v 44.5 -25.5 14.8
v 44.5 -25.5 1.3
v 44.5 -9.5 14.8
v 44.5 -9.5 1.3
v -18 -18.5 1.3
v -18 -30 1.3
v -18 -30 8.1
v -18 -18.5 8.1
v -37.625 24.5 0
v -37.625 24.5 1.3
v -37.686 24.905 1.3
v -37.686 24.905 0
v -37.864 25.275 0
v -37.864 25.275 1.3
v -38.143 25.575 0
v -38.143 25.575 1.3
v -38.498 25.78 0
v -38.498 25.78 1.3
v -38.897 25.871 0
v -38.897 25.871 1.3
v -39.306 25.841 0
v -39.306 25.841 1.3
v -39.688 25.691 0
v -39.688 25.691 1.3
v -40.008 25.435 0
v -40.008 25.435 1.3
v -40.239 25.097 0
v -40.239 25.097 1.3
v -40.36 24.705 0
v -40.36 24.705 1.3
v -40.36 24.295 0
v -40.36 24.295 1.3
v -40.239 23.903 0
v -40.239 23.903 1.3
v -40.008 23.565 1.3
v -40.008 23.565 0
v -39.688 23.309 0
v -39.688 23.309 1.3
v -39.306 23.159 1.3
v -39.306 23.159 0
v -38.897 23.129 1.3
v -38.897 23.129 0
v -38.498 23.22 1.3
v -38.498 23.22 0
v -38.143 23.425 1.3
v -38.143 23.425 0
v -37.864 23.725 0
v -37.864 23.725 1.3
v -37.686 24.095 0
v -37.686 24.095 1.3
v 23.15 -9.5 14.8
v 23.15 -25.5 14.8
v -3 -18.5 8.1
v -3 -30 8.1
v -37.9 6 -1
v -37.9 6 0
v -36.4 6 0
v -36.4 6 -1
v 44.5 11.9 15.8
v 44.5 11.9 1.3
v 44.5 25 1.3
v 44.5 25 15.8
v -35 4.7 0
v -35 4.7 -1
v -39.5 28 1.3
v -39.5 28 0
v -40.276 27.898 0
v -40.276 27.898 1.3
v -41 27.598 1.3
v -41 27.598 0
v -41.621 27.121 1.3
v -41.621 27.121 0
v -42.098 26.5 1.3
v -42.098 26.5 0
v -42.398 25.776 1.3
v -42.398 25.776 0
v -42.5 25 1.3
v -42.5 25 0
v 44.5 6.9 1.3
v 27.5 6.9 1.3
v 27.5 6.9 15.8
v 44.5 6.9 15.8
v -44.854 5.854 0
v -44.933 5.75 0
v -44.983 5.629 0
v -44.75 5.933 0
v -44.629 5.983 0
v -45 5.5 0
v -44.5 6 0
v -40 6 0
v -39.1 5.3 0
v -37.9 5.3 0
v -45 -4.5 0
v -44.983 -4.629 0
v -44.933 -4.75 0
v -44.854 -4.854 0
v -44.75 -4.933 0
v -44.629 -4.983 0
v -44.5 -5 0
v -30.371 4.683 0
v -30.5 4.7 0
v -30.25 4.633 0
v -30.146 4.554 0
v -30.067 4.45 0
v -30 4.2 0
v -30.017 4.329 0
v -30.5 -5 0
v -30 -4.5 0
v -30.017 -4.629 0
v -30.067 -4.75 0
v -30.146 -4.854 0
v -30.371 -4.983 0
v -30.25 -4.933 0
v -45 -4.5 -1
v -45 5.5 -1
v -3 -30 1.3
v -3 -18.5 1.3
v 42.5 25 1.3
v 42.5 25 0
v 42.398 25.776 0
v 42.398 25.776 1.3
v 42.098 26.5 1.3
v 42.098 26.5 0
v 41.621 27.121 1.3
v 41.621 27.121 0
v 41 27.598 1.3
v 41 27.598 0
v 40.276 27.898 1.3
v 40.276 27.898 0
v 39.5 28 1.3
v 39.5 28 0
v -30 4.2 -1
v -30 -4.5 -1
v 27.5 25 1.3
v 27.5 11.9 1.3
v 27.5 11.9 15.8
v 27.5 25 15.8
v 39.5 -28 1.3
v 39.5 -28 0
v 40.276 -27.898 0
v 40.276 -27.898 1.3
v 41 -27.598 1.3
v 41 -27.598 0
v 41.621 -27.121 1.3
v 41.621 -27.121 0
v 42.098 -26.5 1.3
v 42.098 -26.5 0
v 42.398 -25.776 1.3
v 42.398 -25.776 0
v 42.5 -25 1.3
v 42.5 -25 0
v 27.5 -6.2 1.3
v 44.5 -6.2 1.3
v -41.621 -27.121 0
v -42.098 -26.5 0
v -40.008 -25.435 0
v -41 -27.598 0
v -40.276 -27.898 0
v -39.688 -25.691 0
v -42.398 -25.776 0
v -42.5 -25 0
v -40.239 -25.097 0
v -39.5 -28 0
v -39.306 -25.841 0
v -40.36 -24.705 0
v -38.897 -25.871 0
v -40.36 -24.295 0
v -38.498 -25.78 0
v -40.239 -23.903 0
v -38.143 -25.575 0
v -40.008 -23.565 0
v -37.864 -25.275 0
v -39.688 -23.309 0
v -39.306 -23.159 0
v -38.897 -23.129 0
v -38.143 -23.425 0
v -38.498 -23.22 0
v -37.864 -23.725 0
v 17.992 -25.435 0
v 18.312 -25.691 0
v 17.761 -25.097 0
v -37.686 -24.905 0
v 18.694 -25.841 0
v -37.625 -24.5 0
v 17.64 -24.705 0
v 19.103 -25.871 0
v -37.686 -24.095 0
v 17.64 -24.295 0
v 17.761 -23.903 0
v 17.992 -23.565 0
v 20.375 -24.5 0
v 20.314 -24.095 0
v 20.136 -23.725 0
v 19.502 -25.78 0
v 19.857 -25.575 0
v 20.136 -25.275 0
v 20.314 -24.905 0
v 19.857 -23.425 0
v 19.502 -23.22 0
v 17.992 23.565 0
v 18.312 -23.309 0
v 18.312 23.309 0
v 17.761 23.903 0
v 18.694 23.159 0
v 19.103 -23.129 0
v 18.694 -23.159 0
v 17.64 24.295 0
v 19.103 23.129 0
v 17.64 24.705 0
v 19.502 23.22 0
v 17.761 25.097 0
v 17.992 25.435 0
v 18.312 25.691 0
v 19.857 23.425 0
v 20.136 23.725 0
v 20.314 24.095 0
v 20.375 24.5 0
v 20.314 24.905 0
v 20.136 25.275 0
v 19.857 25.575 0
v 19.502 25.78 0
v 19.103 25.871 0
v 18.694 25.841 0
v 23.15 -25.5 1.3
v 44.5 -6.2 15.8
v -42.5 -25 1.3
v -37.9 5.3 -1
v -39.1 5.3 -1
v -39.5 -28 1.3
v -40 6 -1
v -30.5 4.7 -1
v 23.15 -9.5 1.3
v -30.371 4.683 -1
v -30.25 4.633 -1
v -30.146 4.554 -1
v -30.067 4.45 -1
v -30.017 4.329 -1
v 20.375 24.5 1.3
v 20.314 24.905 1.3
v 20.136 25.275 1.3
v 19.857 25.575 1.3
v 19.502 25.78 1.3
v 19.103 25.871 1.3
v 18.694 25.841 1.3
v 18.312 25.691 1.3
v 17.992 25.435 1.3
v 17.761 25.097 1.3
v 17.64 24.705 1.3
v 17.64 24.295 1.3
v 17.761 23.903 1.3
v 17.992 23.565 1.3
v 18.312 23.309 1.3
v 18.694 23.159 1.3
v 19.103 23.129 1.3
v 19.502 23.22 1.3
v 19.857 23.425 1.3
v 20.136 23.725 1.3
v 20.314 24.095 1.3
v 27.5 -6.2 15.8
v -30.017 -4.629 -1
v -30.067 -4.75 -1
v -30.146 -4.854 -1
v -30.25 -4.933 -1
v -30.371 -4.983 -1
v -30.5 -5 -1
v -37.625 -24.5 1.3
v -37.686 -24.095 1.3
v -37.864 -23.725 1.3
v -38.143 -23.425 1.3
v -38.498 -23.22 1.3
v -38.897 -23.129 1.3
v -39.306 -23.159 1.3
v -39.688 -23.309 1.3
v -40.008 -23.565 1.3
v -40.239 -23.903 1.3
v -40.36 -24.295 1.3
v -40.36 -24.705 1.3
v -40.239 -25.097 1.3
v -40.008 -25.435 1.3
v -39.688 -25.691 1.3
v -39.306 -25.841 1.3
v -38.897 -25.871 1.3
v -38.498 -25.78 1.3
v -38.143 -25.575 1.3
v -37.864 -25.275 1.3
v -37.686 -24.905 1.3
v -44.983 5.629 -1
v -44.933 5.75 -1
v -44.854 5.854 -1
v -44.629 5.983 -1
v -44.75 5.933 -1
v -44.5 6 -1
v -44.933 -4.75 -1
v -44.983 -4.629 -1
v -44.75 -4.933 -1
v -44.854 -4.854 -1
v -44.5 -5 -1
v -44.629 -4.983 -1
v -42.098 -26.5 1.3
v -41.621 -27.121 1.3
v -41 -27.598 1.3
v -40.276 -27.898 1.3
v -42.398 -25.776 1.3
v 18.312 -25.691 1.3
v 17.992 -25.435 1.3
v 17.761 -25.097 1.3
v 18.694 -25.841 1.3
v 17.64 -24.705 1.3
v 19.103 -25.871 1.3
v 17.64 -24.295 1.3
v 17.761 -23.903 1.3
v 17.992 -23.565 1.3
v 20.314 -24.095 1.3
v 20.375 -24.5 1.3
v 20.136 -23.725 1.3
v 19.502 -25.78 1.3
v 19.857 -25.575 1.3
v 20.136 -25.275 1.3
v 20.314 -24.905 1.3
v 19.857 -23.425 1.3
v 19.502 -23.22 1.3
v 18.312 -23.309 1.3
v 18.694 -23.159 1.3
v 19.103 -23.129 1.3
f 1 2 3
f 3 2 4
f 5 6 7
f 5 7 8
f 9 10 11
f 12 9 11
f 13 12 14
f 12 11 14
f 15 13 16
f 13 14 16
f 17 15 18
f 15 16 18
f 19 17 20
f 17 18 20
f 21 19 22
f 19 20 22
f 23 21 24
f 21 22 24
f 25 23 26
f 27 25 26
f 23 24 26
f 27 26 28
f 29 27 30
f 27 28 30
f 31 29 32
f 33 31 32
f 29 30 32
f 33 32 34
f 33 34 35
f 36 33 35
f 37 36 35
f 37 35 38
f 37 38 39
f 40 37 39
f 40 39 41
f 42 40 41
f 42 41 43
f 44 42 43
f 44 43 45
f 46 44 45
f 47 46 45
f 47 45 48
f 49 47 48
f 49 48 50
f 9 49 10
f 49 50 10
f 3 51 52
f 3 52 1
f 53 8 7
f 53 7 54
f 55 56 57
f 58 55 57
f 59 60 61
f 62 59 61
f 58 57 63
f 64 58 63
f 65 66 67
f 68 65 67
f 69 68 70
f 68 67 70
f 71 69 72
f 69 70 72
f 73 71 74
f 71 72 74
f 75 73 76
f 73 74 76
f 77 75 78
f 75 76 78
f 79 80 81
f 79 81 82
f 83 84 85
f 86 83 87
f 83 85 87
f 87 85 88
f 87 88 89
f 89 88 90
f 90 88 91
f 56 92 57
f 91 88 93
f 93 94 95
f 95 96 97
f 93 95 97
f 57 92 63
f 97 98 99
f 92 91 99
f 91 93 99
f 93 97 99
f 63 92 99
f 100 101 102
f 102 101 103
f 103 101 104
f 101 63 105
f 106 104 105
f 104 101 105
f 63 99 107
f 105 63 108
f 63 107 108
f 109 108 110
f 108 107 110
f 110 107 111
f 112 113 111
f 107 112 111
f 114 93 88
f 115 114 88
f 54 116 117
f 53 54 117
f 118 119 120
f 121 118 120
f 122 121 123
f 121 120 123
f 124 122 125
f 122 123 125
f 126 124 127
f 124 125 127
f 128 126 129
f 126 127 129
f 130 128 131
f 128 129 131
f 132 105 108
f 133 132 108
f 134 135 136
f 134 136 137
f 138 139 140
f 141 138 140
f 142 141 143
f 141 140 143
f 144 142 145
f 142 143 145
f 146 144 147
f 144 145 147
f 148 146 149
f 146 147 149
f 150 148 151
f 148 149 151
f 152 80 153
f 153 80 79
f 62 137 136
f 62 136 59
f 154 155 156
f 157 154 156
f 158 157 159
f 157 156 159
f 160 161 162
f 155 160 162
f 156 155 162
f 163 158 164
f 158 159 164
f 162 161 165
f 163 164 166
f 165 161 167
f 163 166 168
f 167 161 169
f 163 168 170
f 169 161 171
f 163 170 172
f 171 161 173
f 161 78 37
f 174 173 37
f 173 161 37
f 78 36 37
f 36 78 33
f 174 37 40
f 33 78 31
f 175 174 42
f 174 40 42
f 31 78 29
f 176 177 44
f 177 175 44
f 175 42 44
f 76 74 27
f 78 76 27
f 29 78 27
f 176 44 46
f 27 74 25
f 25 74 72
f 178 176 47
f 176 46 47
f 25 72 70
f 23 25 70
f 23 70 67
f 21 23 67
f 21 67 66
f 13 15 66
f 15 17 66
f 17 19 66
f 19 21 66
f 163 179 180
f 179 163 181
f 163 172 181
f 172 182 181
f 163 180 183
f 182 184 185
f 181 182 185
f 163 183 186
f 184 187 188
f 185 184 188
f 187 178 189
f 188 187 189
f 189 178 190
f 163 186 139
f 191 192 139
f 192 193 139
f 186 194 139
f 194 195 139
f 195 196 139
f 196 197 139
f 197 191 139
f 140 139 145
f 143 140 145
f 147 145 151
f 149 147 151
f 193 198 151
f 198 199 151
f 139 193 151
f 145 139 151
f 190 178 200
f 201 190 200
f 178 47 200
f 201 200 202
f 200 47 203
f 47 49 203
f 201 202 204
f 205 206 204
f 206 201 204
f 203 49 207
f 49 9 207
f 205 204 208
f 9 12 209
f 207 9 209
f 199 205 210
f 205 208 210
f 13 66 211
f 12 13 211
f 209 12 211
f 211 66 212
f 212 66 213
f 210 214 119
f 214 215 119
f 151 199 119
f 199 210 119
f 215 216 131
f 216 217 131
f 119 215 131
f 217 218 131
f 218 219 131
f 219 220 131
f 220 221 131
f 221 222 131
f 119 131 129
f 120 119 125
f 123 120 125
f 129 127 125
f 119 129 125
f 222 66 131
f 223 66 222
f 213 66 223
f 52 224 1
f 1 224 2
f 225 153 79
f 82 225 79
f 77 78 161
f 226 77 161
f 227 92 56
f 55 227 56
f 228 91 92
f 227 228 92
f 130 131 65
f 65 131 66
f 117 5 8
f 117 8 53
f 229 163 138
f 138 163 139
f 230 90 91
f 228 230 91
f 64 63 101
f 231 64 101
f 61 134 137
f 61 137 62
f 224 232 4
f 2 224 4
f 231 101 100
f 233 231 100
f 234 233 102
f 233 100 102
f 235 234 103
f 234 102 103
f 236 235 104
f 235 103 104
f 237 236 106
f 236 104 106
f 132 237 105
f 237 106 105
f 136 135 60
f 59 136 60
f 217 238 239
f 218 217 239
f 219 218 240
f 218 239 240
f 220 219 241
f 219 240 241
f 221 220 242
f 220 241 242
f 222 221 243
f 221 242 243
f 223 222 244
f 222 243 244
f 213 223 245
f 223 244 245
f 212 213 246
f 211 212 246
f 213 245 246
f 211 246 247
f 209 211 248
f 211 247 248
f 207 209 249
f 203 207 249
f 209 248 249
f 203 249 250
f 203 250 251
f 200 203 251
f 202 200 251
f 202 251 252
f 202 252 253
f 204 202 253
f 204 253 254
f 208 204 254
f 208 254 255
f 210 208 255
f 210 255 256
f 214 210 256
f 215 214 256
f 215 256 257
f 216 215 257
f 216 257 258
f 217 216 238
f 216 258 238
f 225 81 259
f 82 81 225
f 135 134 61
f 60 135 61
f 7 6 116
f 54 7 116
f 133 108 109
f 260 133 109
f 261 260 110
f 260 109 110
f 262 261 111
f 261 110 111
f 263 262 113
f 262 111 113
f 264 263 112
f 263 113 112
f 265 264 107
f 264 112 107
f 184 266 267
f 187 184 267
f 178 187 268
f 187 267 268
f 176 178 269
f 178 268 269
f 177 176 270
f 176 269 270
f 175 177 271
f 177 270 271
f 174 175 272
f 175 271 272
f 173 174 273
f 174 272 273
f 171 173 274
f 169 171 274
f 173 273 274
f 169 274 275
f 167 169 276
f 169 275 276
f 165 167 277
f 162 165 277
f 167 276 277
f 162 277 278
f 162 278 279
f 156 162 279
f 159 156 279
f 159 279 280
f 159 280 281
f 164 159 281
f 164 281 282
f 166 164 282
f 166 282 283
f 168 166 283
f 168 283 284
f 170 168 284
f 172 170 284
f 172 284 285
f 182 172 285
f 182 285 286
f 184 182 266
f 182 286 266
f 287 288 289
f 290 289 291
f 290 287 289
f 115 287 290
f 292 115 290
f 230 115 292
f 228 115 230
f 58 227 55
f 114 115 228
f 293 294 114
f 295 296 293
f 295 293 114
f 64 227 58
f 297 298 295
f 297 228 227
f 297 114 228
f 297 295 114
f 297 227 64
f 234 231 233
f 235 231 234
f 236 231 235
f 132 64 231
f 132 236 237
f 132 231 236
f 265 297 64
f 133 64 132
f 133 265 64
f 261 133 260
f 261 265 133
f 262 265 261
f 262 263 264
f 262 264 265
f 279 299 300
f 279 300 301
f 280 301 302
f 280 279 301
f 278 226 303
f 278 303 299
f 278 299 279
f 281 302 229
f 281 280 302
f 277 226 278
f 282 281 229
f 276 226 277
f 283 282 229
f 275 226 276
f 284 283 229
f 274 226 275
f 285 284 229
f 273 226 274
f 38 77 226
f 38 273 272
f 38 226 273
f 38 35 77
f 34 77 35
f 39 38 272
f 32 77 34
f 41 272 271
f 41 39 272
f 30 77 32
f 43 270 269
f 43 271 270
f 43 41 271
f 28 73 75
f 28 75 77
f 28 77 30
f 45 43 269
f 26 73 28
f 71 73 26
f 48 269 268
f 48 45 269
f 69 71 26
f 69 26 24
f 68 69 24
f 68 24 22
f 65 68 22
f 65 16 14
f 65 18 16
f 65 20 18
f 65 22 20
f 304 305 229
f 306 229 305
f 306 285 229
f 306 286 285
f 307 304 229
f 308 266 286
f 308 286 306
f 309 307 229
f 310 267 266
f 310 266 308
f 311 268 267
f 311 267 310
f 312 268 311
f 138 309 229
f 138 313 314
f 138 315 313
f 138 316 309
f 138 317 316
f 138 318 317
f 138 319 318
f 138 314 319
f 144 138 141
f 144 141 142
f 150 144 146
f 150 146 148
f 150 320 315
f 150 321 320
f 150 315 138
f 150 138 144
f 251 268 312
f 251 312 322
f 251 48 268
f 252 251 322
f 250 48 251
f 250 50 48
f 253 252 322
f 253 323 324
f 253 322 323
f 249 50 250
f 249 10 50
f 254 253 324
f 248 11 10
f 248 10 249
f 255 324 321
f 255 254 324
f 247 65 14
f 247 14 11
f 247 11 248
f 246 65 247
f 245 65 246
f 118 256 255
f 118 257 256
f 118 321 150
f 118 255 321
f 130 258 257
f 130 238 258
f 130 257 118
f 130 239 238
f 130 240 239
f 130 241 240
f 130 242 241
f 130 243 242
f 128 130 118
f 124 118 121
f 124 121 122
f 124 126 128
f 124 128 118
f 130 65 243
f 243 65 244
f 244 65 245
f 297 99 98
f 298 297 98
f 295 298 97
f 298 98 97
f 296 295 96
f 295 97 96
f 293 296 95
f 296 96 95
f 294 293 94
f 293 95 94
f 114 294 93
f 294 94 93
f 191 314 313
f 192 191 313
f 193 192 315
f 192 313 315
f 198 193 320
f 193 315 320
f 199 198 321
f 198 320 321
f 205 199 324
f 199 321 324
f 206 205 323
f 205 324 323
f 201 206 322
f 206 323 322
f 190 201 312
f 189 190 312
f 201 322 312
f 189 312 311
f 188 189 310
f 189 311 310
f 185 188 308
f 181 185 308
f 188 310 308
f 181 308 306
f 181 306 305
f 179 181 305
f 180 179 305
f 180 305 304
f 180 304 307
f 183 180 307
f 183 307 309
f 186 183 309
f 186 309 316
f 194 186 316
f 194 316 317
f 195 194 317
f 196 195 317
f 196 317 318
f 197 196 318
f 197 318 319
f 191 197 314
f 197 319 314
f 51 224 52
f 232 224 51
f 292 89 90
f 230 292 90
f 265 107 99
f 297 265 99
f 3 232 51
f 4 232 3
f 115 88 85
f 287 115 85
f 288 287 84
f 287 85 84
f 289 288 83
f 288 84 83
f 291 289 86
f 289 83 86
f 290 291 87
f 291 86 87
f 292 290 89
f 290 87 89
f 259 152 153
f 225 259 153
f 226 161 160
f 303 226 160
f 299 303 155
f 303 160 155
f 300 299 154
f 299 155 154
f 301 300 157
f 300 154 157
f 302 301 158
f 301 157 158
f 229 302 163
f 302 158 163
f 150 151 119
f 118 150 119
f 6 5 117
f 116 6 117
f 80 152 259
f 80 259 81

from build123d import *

# Parameters (mm, degrees)
F1_DEPTH  = 1.3
F2_R      = 1.375
F3_DEPTH  = 1.3
F4_W      = 21.35
F4_H      = 16
F5_DEPTH  = 13.5
F6_W      = 17
F6_H      = 13.1
F7_DEPTH  = 14.5
F8_W      = 15
F8_H      = 11.5
F9_DEPTH  = 6.8
F11_DEPTH = 1


with BuildPart() as f1:
    # F0 (on Top) → F1 (new body)
    with BuildSketch(Plane.XY):
        with BuildLine():
            Line((39.5, 28), (-39.5, 28))
            ThreePointArc((-39.5, 28), (-41.62132, 27.12132), (-42.5, 25))
            Line((-42.5, 25), (-42.5, -25))
            ThreePointArc((-42.5, -25), (-41.62132, -27.12132), (-39.5, -28))
            Line((-39.5, -28), (39.5, -28))
            ThreePointArc((39.5, -28), (41.62132, -27.12132), (42.5, -25))
            Line((42.5, -25), (42.5, 25))
            ThreePointArc((42.5, 25), (41.62132, 27.12132), (39.5, 28))
        make_face()
    extrude(amount=F1_DEPTH)

    # F2 (on face) → F3 (cut, through all)
    with BuildSketch(Plane.XY.offset(1.3)):
        with Locations((-39, 24.5)):
            Circle(F2_R)
        with Locations((19, 24.5)):
            Circle(F2_R)
        with Locations((-39, -24.5)):
            Circle(F2_R)
        with Locations((19, -24.5)):
            Circle(F2_R)
    extrude(amount=-F3_DEPTH, mode=Mode.SUBTRACT)


with BuildPart() as f5:
    # F4 (on face) → F5 (new body)
    with BuildSketch(Plane.XY.offset(1.3)):
        with Locations((33.825, -17.5)):
            Rectangle(F4_W, F4_H)
    extrude(amount=F5_DEPTH)


with BuildPart() as f7:
    # F6 (on face) → F7 (new body)
    with BuildSketch(Plane.XY.offset(1.3)):
        with Locations((36, 0.35)):
            Rectangle(F6_W, F6_H)
        with Locations((36, 18.45)):
            Rectangle(F6_W, F6_H)
    extrude(amount=F7_DEPTH)


with BuildPart() as f9:
    # F8 (on face) → F9 (new body)
    with BuildSketch(Plane.XY.offset(1.3)):
        with Locations((-10.5, -24.25)):
            Rectangle(F8_W, F8_H)
    extrude(amount=F9_DEPTH)


with BuildPart() as f11:
    # F10 (on face) → F11 (new body)
    with BuildSketch(Plane(origin=(0, 0, 0), x_dir=(1, 0, 0), z_dir=(0, 0, -1))):
        with BuildLine():
            ThreePointArc((-44.5, 5), (-44.853553, 4.853553), (-45, 4.5))
            Line((-45, 4.5), (-45, -5.5))
            ThreePointArc((-45, -5.5), (-44.853553, -5.853553), (-44.5, -6))
            Line((-44.5, -6), (-40, -6))
            Line((-40, -6), (-39.1, -5.3))
            Line((-39.1, -5.3), (-37.9, -5.3))
            Line((-37.9, -5.3), (-37.9, -6))
            Line((-37.9, -6), (-36.4, -6))
            Line((-36.4, -6), (-35, -4.7))
            Line((-35, -4.7), (-30.5, -4.7))
            ThreePointArc((-30.5, -4.7), (-30.146447, -4.553553), (-30, -4.2))
            Line((-30, -4.2), (-30, 4.5))
            ThreePointArc((-30, 4.5), (-30.146447, 4.853553), (-30.5, 5))
            Line((-30.5, 5), (-44.5, 5))
        make_face()
    extrude(amount=F11_DEPTH)


solid = Compound([f1.part, f5.part, f7.part, f9.part, f11.part])
